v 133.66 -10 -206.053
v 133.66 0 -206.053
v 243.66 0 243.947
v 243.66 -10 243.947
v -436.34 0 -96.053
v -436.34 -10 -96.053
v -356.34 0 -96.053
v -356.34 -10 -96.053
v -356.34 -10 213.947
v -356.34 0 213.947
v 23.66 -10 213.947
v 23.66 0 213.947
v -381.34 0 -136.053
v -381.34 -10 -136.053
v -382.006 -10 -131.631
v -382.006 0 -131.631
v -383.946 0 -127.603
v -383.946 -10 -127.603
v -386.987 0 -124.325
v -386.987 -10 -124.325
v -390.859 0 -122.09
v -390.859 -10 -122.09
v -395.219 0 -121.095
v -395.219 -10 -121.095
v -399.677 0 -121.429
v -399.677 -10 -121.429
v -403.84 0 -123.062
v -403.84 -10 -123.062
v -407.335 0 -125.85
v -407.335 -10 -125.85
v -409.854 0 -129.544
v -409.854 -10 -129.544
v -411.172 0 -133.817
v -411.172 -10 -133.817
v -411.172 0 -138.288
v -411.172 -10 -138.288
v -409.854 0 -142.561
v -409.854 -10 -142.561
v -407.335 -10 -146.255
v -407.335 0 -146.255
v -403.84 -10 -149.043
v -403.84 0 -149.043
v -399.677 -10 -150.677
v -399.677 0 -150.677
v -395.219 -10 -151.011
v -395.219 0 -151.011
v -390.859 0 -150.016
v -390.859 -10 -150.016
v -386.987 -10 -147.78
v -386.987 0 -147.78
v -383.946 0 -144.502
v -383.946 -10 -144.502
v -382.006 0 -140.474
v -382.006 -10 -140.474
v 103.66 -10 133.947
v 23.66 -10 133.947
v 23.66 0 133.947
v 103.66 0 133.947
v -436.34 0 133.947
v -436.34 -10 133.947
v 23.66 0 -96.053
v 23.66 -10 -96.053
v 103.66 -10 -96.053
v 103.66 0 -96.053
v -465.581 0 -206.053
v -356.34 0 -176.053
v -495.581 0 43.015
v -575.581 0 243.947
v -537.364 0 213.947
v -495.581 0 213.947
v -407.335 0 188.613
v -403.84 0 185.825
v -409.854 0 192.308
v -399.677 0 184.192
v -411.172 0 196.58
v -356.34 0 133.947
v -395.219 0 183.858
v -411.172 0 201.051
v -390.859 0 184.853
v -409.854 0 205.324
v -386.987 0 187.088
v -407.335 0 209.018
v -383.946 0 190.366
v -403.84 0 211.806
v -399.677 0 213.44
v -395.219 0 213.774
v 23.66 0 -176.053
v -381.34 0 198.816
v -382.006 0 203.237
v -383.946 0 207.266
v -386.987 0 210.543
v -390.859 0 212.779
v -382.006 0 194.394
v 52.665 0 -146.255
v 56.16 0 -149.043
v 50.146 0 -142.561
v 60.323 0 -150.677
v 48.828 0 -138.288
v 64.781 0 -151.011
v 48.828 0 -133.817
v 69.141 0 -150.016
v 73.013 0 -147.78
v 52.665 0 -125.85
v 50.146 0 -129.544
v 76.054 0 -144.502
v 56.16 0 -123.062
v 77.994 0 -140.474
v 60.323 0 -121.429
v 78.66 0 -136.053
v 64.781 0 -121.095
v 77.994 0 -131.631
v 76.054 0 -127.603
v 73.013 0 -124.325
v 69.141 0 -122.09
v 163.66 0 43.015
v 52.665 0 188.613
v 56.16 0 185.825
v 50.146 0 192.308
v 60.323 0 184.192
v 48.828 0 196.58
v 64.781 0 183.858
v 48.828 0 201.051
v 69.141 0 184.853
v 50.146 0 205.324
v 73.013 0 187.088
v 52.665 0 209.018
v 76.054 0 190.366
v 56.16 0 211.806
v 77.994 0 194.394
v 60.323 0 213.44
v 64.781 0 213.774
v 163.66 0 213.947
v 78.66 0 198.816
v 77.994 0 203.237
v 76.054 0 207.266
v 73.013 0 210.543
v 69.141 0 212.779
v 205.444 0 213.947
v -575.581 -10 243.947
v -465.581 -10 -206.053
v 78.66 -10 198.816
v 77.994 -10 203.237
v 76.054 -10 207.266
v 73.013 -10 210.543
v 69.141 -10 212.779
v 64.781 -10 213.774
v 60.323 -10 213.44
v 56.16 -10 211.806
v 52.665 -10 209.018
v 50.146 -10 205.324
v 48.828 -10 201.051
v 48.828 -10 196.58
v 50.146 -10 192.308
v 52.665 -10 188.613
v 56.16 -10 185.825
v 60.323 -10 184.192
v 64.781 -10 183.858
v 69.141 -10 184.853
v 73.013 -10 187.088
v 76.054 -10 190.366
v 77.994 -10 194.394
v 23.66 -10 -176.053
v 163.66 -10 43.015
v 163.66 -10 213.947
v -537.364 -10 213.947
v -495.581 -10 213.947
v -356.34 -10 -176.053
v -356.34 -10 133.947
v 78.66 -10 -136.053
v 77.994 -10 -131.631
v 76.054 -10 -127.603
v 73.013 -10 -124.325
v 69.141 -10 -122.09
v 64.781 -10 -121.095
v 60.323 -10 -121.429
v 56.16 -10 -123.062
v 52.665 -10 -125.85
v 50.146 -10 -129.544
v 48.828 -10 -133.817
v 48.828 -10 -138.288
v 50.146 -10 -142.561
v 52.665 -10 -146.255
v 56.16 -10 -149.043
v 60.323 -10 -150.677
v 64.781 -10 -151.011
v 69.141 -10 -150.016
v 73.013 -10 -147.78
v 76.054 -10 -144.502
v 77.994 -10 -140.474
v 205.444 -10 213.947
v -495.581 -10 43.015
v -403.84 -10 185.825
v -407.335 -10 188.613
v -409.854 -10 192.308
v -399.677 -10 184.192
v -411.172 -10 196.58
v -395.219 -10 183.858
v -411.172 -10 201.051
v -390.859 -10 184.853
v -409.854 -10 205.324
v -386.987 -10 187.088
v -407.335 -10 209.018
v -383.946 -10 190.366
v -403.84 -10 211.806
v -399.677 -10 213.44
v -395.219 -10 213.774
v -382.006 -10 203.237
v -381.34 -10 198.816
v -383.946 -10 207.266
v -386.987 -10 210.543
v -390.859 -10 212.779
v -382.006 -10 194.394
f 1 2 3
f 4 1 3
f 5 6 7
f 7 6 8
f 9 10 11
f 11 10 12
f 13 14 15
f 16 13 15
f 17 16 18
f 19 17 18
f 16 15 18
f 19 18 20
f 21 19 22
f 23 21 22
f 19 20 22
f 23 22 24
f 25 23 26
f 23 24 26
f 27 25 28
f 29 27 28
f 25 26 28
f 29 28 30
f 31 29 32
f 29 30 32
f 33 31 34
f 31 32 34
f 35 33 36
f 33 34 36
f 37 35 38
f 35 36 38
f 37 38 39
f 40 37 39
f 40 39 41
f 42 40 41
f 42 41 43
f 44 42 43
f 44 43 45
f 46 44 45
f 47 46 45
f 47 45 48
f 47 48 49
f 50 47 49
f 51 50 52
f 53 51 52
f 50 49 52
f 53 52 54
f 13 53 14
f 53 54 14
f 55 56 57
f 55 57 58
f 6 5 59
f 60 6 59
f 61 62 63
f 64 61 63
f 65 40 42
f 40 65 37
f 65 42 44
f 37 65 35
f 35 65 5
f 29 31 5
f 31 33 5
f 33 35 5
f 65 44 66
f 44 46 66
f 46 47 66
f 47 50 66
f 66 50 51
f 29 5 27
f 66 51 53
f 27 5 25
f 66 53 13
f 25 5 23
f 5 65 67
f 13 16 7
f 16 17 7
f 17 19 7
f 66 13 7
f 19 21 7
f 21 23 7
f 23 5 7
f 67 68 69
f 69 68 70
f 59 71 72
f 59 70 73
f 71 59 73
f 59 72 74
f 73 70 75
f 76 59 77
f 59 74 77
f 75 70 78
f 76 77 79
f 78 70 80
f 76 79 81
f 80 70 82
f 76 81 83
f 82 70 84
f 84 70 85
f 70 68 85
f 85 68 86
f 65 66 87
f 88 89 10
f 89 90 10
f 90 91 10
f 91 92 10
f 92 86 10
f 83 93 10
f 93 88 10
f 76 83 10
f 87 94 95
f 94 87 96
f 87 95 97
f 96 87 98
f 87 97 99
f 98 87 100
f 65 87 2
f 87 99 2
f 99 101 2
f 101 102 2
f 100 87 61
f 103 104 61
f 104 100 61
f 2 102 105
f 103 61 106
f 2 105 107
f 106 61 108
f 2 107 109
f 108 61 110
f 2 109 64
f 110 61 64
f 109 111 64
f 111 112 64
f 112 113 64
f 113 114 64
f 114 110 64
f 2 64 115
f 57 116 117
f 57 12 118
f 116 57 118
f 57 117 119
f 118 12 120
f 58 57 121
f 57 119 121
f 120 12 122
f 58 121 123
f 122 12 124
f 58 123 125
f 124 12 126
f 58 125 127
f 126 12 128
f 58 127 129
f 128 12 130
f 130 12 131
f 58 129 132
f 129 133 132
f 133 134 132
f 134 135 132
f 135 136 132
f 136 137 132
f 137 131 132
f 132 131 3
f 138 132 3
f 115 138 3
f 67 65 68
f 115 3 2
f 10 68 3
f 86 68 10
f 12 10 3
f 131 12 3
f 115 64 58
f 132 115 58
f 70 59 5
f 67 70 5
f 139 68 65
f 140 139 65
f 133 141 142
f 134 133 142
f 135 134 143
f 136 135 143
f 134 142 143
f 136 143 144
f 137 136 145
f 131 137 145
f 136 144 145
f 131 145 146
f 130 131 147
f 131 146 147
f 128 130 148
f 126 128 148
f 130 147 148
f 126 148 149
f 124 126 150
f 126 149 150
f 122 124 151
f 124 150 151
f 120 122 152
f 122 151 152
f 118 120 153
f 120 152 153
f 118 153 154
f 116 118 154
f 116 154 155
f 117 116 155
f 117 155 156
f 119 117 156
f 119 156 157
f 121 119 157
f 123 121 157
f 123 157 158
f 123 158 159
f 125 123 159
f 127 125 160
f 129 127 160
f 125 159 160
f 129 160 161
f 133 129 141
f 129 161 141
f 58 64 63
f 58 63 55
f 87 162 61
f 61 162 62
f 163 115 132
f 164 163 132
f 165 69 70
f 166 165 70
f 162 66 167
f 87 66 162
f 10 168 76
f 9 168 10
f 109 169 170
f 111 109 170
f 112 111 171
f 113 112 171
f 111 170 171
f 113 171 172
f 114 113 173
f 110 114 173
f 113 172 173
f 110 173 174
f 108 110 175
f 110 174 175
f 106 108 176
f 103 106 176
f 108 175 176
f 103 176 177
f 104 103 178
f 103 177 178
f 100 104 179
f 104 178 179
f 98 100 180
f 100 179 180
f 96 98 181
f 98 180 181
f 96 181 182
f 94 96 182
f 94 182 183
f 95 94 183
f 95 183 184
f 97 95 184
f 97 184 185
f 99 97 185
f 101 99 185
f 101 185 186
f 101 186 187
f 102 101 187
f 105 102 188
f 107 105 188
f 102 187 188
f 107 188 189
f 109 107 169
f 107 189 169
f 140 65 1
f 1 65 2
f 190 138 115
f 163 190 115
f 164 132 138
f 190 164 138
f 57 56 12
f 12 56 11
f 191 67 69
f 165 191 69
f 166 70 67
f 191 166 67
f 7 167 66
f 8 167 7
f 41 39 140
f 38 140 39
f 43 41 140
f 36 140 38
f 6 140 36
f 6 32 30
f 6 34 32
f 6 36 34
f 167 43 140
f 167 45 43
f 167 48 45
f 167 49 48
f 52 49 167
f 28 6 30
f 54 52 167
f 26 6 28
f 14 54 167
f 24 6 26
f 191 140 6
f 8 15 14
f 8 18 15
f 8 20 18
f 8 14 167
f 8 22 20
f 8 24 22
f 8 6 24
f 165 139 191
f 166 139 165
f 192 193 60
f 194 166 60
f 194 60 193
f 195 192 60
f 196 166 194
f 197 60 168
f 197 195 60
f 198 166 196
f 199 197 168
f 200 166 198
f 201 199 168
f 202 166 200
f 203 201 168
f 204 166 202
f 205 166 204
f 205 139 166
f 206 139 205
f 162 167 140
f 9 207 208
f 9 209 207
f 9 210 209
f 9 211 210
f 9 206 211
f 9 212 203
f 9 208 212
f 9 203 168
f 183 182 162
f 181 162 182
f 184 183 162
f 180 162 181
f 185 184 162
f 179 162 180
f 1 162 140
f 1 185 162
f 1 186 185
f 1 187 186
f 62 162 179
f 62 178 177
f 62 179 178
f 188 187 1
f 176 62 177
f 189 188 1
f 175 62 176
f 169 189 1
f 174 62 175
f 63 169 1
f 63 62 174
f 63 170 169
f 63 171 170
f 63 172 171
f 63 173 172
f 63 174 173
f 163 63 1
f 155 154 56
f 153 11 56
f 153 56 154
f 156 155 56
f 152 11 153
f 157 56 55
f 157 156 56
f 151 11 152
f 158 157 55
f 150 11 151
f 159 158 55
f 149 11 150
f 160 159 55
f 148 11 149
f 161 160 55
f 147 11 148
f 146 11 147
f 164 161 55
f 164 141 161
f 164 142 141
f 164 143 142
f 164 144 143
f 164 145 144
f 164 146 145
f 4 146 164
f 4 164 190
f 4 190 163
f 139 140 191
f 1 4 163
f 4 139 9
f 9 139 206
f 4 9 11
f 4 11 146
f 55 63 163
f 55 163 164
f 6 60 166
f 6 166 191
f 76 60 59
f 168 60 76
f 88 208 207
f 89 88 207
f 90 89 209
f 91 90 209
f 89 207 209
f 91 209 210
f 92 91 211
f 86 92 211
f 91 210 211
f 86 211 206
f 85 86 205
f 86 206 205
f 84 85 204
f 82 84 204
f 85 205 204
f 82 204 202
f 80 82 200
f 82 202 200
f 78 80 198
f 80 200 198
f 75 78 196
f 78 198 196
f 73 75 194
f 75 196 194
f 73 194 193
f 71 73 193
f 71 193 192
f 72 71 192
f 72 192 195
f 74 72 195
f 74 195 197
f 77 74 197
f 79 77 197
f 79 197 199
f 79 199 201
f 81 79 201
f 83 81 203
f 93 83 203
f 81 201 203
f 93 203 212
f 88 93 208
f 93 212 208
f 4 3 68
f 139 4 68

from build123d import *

# Parameters (mm, degrees)
F0_W     = 540
F0_H     = 390
F1_DEPTH = 10
F2_W     = 80
F2_H     = 80
F2_R     = 15
F3_DEPTH = 10


with BuildPart() as f1:
    # F0 (on Front) → F1 (new body)
    with BuildSketch(Plane.XZ):
        Polygon((-575.5810141563, 243.9473703504), (-465.5810141563, -206.0526296496), (133.660423523, -206.0526296496), (243.660423523, 243.9473703504), (133.660423523, 243.9473703504), (-465.5810141563, 243.9473703504), align=None)
        with Locations((-166.339576477, 18.9473703504)):
            Rectangle(F0_W, F0_H, mode=Mode.SUBTRACT)
        Polygon((-495.5810141563, 43.0153865893), (-537.3643879646, 213.9473703504), (-495.5810141563, 213.9473703504), align=None, mode=Mode.SUBTRACT)
        Polygon((163.660423523, 213.9473703504), (205.4437973313, 213.9473703504), (163.660423523, 43.0153865893), align=None, mode=Mode.SUBTRACT)
    extrude(amount=F1_DEPTH)

    # F2 (on face) → F3 (join)
    with BuildSketch(Plane.XZ.offset(10)):
        with Locations((-396.339576477, 173.9473703504)):
            Rectangle(F2_W, F2_H)
        with Locations((-396.339576477, 198.8157841563)):
            Circle(F2_R, mode=Mode.SUBTRACT)
        with Locations((63.660423523, 173.9473703504)):
            Rectangle(F2_W, F2_H)
        with Locations((63.660423523, 198.8157841563)):
            Circle(F2_R, mode=Mode.SUBTRACT)
        with Locations((63.660423523, -136.0526296496)):
            Rectangle(F2_W, F2_H)
        with Locations((63.660423523, -136.0526296496)):
            Circle(F2_R, mode=Mode.SUBTRACT)
        with Locations((-396.339576477, -136.0526296496)):
            Rectangle(F2_W, F2_H)
        with Locations((-396.339576477, -136.0526296496)):
            Circle(F2_R, mode=Mode.SUBTRACT)
    extrude(amount=-F3_DEPTH)


solid = f1.part
